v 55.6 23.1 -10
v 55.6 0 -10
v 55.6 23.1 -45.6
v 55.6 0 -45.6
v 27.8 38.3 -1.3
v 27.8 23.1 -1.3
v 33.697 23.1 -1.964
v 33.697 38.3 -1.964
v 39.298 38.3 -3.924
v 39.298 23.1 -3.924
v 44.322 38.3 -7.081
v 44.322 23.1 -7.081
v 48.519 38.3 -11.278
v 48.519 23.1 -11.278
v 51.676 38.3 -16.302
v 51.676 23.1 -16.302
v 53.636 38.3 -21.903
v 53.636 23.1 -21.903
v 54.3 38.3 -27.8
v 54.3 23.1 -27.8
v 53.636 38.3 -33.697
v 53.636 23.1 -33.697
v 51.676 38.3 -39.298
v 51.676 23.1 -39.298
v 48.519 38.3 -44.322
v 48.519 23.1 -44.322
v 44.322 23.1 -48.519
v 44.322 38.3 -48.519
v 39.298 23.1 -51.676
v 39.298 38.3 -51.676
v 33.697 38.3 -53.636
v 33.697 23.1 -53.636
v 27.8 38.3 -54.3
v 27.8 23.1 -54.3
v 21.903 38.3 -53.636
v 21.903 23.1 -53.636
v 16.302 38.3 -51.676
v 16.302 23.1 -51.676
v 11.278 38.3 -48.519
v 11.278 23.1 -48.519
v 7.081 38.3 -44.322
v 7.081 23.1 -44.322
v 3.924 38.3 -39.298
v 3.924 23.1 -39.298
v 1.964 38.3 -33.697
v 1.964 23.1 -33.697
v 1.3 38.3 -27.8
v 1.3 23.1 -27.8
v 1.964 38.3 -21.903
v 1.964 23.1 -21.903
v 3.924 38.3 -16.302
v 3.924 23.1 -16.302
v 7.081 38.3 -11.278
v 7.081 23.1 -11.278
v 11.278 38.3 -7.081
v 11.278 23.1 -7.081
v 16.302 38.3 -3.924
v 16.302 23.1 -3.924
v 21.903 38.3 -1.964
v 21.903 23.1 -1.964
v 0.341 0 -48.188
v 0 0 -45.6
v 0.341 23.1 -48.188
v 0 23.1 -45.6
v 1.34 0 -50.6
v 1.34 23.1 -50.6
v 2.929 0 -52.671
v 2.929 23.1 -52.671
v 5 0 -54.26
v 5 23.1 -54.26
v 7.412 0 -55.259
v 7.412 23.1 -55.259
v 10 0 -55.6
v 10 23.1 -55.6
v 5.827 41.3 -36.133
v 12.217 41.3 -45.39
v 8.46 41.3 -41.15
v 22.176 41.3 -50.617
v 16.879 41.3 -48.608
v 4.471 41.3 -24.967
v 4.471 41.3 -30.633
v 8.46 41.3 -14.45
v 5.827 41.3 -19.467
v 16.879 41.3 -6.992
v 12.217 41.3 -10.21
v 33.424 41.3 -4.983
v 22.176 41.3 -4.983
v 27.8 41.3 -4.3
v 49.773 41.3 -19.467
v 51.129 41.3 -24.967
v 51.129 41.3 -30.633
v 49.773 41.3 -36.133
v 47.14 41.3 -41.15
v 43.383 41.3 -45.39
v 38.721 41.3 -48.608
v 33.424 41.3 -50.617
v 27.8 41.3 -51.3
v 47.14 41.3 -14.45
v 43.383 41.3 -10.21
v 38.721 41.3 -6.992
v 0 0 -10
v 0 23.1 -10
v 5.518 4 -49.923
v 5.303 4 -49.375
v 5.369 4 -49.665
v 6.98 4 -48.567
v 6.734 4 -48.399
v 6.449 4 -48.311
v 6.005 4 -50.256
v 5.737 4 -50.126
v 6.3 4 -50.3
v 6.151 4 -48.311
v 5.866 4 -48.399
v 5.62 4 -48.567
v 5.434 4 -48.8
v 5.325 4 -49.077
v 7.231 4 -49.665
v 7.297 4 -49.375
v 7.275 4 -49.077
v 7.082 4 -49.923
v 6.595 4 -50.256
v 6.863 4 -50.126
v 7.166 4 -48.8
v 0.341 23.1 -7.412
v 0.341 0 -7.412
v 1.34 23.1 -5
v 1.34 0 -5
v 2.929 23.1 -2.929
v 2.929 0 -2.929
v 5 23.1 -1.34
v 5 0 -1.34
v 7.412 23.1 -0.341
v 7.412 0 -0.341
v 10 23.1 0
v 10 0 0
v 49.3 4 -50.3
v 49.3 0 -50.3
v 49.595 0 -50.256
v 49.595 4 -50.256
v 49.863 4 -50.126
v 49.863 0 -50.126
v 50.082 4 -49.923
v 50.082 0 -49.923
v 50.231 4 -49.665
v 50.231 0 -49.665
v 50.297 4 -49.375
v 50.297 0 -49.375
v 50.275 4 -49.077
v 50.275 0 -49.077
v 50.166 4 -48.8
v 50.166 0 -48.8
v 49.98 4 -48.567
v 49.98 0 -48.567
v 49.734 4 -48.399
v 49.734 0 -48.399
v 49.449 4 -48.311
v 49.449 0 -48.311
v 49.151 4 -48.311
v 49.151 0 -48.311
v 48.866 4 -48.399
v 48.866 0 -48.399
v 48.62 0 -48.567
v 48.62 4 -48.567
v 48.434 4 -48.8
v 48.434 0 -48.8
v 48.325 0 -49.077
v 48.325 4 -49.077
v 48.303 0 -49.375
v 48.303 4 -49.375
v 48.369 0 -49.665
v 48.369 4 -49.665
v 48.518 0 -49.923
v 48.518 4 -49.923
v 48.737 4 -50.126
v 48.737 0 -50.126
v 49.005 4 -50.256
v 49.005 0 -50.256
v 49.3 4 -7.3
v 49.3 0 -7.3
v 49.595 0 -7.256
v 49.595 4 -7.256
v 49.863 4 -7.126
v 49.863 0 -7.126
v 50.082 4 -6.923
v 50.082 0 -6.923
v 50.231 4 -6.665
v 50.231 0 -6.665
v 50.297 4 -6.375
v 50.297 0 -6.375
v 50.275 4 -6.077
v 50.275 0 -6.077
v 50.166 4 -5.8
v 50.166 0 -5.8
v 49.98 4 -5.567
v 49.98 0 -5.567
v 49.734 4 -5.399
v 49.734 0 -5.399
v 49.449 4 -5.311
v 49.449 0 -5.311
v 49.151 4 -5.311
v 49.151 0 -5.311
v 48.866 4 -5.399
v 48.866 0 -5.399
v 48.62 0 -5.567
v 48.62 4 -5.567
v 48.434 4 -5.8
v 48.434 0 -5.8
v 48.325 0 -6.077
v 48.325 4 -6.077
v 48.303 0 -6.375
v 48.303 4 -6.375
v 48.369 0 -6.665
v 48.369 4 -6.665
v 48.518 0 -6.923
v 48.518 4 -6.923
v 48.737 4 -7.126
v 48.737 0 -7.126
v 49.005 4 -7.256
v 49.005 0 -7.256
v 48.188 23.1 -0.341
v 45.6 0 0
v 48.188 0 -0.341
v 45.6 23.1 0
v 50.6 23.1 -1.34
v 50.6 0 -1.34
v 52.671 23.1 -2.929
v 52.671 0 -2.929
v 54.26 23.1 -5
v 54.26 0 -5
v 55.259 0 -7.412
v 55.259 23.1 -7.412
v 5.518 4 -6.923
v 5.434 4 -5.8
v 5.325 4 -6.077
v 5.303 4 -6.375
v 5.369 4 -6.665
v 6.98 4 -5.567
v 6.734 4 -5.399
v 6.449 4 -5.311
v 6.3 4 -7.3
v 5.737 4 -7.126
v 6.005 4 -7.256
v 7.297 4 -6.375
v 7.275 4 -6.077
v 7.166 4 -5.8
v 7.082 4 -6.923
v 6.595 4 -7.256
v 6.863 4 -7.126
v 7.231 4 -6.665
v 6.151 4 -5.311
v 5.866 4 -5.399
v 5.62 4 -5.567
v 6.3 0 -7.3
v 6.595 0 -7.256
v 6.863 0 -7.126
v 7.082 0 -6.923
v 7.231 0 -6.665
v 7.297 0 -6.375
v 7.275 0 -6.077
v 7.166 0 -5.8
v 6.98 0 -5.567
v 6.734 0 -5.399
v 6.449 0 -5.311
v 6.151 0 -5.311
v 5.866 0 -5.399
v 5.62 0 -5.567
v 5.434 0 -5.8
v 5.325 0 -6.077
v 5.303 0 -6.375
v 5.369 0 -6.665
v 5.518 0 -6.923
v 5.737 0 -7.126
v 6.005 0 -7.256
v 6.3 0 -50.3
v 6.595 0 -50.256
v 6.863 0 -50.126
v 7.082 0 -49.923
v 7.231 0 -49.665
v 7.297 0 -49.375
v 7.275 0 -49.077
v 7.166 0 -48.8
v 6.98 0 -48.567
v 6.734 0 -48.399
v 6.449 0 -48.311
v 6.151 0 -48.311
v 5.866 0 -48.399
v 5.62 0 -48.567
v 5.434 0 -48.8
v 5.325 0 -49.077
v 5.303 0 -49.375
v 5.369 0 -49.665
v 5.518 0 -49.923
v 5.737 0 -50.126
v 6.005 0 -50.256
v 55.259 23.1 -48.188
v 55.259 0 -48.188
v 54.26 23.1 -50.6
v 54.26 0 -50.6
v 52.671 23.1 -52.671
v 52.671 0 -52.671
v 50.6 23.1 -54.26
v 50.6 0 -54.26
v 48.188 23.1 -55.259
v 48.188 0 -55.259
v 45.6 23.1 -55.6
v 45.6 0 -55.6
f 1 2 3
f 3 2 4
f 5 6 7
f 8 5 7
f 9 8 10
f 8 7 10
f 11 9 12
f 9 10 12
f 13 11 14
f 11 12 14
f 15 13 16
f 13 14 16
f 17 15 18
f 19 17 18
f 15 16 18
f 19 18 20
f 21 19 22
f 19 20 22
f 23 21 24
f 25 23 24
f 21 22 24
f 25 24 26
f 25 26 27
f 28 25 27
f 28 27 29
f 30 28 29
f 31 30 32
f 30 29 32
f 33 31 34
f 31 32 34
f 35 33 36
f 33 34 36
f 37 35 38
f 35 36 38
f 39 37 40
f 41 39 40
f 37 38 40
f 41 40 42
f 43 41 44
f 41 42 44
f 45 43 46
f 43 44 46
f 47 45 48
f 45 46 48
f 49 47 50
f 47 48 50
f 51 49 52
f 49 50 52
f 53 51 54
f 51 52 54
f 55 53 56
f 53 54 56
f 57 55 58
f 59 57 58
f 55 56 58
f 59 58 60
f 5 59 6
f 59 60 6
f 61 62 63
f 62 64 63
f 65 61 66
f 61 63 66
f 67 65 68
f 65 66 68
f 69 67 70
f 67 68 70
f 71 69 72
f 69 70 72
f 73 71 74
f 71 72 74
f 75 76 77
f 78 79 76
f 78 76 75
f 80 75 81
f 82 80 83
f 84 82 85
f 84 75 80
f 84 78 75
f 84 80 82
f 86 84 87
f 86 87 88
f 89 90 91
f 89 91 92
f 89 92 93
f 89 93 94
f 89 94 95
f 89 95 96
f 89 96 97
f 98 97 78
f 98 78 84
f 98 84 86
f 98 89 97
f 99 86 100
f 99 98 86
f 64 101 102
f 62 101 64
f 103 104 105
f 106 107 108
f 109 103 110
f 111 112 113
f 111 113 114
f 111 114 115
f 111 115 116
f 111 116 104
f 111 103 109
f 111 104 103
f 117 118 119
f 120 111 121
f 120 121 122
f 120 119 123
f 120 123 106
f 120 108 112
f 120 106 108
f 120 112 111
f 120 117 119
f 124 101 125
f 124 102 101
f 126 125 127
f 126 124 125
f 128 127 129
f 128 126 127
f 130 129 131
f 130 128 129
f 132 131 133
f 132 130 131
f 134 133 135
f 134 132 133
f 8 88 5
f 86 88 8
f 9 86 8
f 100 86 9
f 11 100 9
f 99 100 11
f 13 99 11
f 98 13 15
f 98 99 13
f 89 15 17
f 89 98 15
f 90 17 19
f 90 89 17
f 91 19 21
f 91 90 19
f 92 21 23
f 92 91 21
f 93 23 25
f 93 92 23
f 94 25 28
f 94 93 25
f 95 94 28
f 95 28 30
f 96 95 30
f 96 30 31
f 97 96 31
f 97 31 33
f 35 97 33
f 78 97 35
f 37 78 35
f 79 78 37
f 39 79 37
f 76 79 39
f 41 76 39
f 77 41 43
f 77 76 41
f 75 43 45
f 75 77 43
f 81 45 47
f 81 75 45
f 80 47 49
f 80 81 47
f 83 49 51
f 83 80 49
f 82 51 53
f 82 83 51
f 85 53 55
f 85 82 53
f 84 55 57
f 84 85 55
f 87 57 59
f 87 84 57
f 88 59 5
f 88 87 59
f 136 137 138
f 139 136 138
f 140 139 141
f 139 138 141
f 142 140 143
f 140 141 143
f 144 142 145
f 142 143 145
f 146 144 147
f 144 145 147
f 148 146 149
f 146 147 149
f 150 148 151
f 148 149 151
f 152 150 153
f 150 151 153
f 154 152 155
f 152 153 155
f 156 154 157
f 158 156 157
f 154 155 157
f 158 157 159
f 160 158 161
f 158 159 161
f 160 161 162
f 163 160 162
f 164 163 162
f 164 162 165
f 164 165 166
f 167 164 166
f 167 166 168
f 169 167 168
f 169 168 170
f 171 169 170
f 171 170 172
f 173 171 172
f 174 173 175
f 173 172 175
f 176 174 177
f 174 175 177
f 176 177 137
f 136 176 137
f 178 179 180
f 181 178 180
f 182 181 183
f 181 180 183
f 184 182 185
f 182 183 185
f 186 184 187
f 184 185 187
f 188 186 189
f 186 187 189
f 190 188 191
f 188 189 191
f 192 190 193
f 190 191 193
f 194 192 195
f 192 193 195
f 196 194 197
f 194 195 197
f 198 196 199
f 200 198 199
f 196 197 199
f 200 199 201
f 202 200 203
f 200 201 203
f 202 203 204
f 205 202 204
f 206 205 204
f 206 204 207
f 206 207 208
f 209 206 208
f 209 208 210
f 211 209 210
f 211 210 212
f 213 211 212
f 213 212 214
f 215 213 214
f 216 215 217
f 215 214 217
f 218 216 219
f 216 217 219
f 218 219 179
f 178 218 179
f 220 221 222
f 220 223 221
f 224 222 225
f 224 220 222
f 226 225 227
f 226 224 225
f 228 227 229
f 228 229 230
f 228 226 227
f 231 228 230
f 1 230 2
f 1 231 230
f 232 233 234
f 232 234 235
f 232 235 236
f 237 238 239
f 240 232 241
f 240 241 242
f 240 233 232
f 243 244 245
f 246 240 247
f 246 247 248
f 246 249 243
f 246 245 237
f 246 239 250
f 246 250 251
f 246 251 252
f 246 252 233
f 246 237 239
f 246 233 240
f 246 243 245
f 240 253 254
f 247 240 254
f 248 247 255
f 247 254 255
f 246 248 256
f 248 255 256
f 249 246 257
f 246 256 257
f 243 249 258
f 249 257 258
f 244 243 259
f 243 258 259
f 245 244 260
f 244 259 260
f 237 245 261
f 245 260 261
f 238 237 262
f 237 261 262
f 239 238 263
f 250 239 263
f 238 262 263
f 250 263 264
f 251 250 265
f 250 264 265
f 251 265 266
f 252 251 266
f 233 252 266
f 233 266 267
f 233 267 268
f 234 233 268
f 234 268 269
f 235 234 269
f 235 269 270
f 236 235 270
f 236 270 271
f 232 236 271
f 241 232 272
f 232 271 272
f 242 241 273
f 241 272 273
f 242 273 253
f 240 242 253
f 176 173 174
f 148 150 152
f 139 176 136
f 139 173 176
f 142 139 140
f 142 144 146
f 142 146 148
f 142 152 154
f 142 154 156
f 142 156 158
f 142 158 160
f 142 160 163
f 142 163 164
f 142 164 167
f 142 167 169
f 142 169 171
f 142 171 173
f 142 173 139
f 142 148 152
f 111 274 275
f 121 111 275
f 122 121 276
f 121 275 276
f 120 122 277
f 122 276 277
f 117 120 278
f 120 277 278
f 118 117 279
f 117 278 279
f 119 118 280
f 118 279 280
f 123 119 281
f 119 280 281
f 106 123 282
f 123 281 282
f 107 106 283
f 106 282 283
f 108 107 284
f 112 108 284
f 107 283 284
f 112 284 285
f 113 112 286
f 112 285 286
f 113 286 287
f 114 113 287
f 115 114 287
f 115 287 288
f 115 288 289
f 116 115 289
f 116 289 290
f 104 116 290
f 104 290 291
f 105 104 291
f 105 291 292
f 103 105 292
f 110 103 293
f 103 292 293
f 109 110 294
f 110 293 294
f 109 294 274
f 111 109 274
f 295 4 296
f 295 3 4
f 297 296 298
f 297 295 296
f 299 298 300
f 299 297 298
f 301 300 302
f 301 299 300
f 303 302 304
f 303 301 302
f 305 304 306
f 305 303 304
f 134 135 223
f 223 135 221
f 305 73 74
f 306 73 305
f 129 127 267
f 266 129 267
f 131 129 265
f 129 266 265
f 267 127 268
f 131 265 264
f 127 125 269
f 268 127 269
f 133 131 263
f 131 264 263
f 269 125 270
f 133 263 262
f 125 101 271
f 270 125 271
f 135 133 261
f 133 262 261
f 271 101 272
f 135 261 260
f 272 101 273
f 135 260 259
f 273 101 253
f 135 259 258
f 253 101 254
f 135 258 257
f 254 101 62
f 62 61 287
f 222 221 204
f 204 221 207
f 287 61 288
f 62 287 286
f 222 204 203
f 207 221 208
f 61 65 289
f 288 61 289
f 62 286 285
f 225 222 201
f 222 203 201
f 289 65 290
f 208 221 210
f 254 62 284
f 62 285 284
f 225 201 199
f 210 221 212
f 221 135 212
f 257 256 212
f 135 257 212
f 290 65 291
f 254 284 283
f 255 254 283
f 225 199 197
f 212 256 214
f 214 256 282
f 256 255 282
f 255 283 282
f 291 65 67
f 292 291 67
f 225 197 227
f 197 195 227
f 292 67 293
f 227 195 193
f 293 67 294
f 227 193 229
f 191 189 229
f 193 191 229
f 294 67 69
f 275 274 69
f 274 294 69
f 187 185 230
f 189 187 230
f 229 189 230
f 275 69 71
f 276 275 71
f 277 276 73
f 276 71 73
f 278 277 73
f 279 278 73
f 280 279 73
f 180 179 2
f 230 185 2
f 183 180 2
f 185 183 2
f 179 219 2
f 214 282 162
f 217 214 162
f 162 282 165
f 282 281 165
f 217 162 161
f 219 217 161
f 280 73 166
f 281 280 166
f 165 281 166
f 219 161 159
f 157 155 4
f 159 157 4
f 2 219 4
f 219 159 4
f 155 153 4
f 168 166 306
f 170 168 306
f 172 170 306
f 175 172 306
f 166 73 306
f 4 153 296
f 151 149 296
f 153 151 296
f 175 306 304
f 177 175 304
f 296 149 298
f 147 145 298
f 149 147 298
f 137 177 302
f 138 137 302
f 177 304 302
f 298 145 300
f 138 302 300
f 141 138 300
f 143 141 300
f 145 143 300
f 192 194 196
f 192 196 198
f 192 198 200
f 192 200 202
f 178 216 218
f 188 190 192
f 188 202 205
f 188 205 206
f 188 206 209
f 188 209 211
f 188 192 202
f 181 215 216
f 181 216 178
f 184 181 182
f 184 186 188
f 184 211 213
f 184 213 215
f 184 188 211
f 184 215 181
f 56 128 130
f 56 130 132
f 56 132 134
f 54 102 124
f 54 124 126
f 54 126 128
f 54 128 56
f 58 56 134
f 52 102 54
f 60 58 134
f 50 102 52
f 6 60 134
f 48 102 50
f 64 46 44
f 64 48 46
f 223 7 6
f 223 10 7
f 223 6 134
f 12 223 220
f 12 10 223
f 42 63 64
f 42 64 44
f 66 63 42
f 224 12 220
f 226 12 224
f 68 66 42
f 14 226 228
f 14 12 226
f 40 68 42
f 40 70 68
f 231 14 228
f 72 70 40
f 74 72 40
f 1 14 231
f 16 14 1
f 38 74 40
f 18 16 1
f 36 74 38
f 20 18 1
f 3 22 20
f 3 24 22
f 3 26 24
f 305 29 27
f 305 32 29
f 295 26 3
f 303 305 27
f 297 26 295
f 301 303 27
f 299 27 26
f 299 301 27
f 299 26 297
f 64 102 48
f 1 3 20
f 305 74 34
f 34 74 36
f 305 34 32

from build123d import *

# Parameters (mm, degrees)
SKETCH1_W           = 55.6
SKETCH1_H           = 55.6
BOSS_EXTRUDE1_DEPTH = 23.1
FILLET1_R           = 10
SKETCH2_R           = 1
SCREW_HOLES_DEPTH   = 4
SKETCH3_R           = 26.5
BOSS_EXTRUDE2_DEPTH = 18.2
CHAMFER1_SIZE       = 3


with BuildPart() as part:
    # Sketch1 → Boss-Extrude1 (new body)
    with BuildSketch(Plane(origin=(0, 0, 0), x_dir=(1, 0, 0), z_dir=(0, 1, 0))):
        with Locations((27.8, 27.8)):
            Rectangle(SKETCH1_W, SKETCH1_H)
    extrude(amount=BOSS_EXTRUDE1_DEPTH)

    # Fillet1
    fillet1_edges = [part.edges().sort_by_distance(p)[0] for p in [
        (0, 11.55, -55.6),
        (55.6, 11.55, -55.6),
        (55.6, 11.55, 0),
        (0, 11.55, 0),
    ]]
    fillet(fillet1_edges, radius=FILLET1_R)

    # Sketch2 → Screw Holes (cut)
    with BuildSketch(Plane.XZ):
        with Locations(Location((6.3, -6.3, 0), (0, 0, 270))):
            Circle(SKETCH2_R)
        with Locations(Location((49.3, -6.3, 0), (0, 0, 270))):
            Circle(SKETCH2_R)
        with Locations(Location((49.3, -49.3, 0), (0, 0, 270))):
            Circle(SKETCH2_R)
        with Locations(Location((6.3, -49.3, 0), (0, 0, 270))):
            Circle(SKETCH2_R)
    extrude(amount=-SCREW_HOLES_DEPTH, mode=Mode.SUBTRACT)

    # Sketch3 → Boss-Extrude2 (add)
    with BuildSketch(Plane(origin=(0, 23.1, 0), x_dir=(1, 0, 0), z_dir=(0, 1, 0))):
        with Locations(Location((27.8, 27.8, 0), (0, 0, 270))):
            Circle(SKETCH3_R)
    extrude(amount=BOSS_EXTRUDE2_DEPTH)

    # Chamfer1
    chamfer1_edges = [part.edges().sort_by_distance(p)[0] for p in [
        (27.8, 41.3, -54.3),
    ]]
    chamfer(chamfer1_edges, length=CHAMFER1_SIZE)


solid = part.part
